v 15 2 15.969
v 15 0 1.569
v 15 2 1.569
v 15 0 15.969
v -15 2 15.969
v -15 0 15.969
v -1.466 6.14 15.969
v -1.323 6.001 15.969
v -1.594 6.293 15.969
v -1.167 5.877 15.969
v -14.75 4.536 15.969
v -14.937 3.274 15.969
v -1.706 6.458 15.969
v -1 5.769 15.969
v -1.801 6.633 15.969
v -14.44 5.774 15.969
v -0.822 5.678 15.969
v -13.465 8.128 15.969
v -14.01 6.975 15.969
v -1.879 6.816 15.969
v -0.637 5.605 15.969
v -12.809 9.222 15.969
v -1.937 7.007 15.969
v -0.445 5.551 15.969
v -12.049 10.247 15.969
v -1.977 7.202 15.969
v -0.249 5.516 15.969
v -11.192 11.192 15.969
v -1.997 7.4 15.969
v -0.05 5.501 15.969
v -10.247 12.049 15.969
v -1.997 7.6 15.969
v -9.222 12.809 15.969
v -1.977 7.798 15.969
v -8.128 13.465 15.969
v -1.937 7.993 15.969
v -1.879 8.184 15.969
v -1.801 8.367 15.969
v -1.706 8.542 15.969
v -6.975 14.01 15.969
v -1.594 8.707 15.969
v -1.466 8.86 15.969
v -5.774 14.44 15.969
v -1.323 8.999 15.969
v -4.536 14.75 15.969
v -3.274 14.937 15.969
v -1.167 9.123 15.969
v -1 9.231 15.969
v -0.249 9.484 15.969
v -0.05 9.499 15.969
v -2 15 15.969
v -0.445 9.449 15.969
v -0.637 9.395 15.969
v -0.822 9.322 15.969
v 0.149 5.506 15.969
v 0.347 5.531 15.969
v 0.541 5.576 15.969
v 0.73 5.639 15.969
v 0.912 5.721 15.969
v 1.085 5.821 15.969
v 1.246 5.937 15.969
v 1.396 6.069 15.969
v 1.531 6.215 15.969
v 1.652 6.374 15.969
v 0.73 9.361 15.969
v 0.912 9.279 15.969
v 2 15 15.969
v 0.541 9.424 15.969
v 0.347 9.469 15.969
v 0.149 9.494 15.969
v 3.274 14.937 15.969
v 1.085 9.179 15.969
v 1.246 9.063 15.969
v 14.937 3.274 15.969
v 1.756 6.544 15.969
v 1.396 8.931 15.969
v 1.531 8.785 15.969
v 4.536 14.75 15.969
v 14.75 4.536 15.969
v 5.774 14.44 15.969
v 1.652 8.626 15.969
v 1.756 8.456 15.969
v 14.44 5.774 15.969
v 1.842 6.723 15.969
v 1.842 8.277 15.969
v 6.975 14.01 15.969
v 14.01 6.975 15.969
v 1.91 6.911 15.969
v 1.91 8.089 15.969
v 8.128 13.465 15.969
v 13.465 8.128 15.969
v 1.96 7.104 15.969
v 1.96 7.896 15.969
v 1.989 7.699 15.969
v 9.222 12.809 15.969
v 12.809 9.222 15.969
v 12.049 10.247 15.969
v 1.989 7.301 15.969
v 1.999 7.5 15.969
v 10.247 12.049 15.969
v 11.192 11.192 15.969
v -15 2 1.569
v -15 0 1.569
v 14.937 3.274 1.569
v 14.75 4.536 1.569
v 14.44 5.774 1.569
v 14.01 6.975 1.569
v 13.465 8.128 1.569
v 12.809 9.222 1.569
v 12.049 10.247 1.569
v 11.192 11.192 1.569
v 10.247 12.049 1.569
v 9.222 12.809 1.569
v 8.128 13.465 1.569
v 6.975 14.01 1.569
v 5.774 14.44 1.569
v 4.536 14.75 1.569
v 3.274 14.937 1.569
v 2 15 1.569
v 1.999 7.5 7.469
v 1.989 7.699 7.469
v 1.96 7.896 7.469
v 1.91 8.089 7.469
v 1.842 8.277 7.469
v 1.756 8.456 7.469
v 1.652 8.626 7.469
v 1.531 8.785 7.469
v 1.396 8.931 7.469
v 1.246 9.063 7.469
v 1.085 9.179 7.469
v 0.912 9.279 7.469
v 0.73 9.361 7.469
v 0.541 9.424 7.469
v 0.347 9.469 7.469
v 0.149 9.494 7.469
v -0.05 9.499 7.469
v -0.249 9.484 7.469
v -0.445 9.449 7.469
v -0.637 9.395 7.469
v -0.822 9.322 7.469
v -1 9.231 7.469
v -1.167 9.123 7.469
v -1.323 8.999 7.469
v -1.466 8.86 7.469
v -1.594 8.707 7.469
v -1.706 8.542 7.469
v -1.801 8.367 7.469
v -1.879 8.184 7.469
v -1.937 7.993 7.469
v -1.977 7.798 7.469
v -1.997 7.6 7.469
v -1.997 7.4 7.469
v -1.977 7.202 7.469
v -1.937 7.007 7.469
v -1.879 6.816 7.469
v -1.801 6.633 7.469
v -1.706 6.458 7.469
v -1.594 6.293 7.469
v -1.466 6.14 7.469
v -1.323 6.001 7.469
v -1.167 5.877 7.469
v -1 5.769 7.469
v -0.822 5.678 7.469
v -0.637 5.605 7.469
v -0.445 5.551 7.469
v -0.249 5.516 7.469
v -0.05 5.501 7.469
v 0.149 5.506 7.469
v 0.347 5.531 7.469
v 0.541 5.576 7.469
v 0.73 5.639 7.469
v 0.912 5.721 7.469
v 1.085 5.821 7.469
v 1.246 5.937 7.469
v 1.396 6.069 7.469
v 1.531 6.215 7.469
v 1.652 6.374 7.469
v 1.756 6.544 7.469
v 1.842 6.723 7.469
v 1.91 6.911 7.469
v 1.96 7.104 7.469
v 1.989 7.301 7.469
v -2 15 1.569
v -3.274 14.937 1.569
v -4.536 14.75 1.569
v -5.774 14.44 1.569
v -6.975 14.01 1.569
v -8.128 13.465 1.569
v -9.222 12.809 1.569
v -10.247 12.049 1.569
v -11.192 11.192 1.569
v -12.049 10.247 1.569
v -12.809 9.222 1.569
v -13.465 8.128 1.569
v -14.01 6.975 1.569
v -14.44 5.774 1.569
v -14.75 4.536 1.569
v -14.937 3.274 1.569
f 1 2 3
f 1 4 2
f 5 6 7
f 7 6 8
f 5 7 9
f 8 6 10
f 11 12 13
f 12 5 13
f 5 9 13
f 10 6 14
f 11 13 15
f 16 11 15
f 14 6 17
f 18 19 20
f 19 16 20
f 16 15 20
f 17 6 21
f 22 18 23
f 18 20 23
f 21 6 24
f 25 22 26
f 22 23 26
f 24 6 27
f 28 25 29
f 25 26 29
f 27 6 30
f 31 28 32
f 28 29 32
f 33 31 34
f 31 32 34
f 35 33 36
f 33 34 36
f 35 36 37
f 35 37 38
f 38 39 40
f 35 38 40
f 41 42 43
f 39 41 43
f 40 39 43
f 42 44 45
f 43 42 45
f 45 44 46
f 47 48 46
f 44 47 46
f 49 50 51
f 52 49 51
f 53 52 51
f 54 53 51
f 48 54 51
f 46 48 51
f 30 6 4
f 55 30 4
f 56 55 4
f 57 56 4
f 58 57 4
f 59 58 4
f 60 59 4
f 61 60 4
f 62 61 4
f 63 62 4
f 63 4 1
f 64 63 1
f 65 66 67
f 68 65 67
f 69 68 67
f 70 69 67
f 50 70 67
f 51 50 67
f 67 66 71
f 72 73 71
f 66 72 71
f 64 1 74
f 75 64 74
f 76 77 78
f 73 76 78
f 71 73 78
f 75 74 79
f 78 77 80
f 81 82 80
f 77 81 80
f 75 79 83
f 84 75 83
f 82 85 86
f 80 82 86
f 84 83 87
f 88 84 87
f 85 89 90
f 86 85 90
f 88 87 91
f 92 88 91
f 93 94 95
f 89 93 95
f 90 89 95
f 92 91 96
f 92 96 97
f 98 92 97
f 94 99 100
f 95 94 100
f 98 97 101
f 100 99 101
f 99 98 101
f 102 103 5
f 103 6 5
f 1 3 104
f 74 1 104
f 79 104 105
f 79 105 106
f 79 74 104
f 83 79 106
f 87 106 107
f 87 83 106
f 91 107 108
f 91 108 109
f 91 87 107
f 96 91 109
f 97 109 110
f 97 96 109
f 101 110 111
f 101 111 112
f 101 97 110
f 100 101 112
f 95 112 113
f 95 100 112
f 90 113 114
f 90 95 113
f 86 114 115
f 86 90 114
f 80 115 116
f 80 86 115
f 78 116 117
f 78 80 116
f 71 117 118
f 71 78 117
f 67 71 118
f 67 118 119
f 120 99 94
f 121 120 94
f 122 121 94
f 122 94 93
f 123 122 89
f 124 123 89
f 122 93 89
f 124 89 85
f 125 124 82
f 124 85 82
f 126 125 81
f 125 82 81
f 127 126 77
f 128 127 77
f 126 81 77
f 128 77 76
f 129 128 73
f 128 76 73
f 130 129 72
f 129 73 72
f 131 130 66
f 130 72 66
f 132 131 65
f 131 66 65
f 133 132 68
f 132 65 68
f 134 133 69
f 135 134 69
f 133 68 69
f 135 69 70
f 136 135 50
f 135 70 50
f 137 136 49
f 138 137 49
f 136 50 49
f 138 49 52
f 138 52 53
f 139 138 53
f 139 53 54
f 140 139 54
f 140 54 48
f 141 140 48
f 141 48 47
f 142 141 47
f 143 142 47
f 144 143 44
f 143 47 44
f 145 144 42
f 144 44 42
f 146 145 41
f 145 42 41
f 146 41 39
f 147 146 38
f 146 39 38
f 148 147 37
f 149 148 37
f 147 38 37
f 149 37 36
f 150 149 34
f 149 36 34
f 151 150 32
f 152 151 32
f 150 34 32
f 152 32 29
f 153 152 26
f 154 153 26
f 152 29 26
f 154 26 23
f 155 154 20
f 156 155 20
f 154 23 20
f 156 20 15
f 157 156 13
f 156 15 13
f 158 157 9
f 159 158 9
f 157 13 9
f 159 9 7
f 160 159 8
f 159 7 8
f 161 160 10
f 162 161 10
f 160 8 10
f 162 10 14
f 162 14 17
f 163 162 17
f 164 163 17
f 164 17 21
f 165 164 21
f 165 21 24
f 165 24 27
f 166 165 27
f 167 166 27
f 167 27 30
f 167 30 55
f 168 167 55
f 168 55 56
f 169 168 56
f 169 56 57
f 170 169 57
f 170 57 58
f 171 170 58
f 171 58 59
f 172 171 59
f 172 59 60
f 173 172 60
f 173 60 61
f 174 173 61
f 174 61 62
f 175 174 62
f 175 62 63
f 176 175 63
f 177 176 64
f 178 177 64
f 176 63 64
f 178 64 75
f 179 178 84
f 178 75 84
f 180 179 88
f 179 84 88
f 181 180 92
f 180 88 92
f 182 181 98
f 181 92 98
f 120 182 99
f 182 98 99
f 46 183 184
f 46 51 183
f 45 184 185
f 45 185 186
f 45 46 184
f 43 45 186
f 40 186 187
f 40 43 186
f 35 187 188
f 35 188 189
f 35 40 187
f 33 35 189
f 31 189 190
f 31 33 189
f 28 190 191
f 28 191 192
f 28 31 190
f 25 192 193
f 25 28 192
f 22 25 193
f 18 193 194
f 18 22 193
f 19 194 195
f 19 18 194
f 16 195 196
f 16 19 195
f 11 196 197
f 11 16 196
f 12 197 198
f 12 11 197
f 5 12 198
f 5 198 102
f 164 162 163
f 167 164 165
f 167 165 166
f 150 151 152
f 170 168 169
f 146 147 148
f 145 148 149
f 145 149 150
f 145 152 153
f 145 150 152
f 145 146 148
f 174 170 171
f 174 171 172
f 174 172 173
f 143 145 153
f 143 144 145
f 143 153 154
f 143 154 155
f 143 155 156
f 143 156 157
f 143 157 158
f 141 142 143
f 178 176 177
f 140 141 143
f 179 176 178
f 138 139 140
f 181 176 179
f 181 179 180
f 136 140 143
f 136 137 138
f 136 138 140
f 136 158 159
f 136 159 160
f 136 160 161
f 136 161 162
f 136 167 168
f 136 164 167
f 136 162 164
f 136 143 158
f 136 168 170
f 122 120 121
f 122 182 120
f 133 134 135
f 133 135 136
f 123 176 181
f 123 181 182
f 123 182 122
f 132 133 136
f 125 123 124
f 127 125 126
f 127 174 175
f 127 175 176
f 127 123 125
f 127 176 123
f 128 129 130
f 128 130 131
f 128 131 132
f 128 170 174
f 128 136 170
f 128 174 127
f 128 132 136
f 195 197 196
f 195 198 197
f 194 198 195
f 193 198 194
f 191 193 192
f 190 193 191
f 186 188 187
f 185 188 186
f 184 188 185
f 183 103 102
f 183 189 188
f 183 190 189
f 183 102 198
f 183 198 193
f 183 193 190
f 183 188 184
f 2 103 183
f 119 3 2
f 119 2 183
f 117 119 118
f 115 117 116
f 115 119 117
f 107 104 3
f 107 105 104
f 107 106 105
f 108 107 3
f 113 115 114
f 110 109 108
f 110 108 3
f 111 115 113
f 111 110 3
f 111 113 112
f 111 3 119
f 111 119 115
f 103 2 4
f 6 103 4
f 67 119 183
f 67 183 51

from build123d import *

# Parameters (mm, degrees)
F0_W     = 15
F0_H     = 14.4
F1_DEPTH = 15
F2_R     = 13
F3_R     = 1.999218
F4_DEPTH = 8.5


with BuildPart() as f1:
    # F0 (on Right) → F1 (new body, symmetric)
    with BuildSketch(Plane.YZ):
        with Locations((7.5, 8.768751)):
            Rectangle(F0_W, F0_H)
    extrude(amount=F1_DEPTH, both=True)

    # F2
    f2_edges = [f1.edges().sort_by_distance(p)[0] for p in [
        (-15, 15, 8.768751),
        (15, 15, 8.768751),
    ]]
    fillet(f2_edges, radius=F2_R)

    # F3 (on face) → F4 (cut)
    with BuildSketch(Plane.XY.offset(15.968751)):
        with Locations((0, 7.5)):
            Circle(F3_R)
    extrude(amount=-F4_DEPTH, mode=Mode.SUBTRACT)


solid = f1.part
